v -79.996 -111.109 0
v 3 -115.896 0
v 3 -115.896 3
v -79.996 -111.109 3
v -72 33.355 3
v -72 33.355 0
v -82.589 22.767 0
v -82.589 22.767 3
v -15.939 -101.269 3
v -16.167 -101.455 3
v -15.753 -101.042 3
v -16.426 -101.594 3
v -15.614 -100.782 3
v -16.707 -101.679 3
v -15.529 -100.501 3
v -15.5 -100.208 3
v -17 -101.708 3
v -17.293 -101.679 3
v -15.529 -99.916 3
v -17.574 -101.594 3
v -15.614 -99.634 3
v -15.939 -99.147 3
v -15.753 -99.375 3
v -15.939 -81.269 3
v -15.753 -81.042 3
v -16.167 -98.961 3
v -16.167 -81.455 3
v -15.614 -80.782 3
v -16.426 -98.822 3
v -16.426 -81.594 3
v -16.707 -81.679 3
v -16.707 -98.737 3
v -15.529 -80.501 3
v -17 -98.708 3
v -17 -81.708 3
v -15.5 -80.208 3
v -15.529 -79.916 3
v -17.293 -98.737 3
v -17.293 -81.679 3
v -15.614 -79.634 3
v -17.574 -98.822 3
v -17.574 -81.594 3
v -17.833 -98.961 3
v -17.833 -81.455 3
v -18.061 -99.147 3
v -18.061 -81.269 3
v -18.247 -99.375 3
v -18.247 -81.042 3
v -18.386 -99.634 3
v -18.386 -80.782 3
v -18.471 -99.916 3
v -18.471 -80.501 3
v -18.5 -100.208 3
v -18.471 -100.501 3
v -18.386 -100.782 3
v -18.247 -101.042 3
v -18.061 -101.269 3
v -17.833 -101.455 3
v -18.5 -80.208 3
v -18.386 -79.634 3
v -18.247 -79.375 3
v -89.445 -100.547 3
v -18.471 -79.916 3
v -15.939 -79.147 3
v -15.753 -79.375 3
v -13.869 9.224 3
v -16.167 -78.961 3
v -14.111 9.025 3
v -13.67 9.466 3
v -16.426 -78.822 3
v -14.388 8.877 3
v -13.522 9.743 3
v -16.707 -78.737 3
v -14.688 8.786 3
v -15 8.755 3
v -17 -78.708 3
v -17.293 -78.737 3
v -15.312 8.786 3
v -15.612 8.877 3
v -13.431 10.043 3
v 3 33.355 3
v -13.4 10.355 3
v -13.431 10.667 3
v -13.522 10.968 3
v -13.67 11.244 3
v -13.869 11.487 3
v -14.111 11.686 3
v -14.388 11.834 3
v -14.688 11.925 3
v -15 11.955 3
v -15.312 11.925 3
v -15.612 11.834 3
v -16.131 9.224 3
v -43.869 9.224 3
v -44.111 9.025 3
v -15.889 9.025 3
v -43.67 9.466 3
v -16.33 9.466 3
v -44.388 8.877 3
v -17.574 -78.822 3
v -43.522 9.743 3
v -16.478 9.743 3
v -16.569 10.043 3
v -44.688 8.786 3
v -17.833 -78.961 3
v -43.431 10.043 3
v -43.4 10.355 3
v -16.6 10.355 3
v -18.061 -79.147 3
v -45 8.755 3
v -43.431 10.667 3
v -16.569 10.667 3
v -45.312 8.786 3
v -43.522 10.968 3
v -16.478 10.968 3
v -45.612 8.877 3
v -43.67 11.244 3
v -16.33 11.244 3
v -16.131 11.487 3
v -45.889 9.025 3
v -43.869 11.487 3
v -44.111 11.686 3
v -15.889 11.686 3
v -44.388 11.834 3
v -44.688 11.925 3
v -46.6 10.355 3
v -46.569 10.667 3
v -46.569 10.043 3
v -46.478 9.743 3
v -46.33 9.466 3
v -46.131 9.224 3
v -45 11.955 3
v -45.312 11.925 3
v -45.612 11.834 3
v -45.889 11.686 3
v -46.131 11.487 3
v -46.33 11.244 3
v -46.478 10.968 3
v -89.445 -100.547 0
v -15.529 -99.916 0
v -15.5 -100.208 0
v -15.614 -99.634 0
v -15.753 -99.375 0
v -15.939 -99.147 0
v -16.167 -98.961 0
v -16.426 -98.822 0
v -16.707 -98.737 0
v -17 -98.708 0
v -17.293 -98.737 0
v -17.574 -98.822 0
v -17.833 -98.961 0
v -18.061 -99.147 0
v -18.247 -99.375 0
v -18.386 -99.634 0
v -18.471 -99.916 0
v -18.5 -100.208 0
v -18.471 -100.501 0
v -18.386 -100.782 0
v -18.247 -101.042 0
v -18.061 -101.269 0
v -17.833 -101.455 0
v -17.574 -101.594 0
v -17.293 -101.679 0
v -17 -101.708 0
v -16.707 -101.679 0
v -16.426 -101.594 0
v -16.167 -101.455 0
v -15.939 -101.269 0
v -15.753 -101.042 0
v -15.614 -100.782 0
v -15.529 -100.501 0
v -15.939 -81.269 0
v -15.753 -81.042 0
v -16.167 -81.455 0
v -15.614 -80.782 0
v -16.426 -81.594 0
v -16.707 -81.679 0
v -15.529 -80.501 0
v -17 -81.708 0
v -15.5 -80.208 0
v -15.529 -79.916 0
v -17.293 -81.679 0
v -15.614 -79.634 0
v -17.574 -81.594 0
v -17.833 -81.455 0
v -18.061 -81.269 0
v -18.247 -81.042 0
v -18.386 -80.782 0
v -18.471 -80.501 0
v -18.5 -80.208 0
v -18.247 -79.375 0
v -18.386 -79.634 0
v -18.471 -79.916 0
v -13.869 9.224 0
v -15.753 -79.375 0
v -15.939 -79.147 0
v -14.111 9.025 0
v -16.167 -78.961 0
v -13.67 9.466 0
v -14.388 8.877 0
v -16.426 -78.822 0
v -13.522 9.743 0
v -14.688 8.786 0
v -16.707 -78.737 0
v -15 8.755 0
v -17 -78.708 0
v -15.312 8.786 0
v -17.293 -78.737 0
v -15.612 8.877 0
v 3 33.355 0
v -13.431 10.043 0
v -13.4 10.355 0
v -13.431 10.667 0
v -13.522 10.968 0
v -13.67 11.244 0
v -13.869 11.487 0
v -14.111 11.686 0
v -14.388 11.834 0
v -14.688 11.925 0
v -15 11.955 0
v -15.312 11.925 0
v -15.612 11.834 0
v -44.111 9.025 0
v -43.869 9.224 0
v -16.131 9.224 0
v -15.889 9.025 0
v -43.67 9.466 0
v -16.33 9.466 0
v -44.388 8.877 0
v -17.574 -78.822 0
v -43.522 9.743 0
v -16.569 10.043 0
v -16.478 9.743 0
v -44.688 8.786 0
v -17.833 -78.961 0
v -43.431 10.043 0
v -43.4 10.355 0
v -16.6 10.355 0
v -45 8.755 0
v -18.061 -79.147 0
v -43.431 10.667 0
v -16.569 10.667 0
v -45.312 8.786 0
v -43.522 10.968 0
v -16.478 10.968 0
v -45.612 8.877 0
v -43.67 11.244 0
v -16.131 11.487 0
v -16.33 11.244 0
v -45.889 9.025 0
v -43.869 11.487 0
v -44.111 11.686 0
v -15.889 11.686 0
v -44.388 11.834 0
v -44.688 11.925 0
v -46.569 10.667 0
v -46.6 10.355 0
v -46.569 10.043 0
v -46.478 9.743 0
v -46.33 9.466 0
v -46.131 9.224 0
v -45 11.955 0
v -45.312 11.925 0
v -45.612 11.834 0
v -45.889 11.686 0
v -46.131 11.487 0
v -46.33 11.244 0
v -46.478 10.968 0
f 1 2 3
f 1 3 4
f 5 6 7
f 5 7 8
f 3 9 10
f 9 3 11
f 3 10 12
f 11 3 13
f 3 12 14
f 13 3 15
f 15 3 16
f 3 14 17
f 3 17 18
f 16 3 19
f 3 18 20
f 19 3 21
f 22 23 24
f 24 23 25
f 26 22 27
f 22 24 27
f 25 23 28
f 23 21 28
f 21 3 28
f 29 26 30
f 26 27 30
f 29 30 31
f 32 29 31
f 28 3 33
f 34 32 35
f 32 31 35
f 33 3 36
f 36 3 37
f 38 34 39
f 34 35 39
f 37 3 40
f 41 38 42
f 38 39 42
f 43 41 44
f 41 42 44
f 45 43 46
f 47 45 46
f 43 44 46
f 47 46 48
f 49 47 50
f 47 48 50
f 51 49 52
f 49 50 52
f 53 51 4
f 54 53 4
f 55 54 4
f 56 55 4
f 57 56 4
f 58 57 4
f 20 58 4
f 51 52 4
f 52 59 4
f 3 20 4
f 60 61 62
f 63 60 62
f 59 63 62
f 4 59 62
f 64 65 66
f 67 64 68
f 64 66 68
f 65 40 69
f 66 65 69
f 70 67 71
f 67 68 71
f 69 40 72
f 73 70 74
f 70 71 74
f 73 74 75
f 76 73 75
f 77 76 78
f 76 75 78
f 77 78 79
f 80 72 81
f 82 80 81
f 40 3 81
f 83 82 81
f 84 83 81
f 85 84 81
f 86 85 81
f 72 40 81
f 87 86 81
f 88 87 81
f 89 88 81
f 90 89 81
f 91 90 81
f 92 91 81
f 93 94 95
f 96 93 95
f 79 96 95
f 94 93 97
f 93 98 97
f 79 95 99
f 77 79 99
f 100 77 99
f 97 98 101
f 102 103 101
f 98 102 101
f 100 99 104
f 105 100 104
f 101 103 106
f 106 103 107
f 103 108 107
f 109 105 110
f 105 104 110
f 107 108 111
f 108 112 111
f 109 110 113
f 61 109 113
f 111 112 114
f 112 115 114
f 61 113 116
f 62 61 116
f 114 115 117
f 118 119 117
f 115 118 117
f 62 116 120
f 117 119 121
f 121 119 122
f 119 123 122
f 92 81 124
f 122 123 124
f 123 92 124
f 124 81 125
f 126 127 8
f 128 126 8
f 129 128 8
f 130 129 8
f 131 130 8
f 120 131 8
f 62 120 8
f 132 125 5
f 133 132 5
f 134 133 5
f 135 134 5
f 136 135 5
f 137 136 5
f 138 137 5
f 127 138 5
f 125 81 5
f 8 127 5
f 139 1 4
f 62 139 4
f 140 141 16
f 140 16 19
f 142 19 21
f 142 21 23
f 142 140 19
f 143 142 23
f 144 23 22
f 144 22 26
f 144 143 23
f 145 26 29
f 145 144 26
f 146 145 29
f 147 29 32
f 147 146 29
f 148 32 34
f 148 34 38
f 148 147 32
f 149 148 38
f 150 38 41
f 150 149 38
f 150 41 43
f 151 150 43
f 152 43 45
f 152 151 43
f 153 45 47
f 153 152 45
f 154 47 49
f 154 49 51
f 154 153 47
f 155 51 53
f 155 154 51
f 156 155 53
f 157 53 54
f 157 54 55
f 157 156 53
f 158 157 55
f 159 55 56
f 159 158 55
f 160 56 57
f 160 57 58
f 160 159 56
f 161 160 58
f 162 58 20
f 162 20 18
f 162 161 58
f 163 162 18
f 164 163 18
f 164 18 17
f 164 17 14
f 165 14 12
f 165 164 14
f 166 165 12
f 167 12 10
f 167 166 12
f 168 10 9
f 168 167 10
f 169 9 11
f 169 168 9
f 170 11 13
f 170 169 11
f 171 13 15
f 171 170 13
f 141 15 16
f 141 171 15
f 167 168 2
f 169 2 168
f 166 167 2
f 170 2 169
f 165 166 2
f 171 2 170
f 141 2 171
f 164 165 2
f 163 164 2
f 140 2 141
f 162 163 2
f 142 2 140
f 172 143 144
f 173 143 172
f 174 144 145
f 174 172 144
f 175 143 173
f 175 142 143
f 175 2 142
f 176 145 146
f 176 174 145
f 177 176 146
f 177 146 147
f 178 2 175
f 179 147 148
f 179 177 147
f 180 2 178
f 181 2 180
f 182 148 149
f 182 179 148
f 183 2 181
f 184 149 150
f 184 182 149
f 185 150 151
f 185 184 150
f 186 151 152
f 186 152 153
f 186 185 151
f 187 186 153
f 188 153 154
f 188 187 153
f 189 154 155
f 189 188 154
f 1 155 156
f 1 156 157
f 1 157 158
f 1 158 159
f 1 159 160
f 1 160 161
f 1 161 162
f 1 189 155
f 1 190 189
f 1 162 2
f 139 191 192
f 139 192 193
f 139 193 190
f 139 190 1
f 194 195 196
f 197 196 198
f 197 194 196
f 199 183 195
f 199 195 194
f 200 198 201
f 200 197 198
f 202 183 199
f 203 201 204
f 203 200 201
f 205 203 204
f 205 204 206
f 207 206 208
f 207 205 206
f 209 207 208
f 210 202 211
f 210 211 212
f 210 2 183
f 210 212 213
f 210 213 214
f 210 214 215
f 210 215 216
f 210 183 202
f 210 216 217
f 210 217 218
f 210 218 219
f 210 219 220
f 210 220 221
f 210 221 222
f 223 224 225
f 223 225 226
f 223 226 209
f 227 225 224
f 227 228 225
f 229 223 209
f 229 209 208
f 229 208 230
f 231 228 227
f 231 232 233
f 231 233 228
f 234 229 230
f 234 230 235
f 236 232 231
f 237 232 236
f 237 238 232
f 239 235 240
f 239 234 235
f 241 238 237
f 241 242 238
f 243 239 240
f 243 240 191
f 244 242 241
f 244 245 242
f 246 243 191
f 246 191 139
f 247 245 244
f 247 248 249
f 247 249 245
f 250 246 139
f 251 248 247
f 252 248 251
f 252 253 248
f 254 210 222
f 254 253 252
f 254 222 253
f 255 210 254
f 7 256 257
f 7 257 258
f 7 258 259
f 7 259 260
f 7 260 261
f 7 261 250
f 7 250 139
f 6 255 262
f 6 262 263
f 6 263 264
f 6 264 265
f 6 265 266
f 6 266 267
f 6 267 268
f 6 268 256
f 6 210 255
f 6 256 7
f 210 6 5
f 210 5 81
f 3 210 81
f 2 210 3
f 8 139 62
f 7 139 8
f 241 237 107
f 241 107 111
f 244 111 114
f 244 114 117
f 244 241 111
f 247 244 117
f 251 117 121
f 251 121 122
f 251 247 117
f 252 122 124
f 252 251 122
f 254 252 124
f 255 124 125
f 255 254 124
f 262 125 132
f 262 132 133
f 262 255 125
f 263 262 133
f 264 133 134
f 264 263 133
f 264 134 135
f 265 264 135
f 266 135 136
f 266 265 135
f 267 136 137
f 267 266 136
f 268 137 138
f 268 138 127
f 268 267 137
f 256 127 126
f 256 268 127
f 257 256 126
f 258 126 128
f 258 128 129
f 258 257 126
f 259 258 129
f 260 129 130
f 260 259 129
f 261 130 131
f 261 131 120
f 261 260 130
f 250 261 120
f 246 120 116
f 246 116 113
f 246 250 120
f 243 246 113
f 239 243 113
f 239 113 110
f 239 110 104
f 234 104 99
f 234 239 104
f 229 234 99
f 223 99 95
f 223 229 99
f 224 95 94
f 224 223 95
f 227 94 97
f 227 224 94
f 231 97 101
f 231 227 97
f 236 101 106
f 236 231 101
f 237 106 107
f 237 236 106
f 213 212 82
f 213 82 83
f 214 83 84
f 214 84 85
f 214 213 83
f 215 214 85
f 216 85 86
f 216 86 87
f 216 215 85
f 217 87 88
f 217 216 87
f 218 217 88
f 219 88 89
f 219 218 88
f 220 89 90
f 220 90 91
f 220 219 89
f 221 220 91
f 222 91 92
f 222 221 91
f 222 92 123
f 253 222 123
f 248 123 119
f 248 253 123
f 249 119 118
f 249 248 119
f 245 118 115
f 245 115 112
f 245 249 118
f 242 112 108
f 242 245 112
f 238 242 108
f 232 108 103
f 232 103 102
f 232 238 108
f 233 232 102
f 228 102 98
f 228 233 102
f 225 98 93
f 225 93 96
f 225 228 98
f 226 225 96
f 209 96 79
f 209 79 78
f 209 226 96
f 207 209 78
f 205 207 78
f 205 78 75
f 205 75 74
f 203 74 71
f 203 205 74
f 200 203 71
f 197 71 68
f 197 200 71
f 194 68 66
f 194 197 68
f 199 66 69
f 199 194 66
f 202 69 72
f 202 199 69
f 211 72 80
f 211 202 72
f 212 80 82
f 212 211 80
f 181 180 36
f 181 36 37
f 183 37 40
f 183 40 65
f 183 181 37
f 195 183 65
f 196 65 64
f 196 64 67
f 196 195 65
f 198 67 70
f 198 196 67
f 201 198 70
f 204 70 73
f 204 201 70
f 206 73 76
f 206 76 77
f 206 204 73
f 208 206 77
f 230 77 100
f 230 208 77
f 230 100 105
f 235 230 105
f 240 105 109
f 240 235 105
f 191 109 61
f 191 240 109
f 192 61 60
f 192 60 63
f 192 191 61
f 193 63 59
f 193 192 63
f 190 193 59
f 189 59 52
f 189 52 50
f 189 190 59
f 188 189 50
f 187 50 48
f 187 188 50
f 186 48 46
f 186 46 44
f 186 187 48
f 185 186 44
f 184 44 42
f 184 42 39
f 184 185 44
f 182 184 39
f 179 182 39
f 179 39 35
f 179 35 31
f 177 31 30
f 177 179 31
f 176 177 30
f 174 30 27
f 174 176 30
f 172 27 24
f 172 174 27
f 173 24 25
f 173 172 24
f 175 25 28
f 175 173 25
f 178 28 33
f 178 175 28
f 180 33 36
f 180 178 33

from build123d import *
from OCP.BRepFilletAPI import BRepFilletAPI_MakeChamfer

# Parameters (mm, degrees)
SKETCH1_R           = 1.6
SKETCH1_R_2         = 1.5
BOSS_EXTRUDE1_DEPTH = 3
CHAMFER1_SIZE       = 10
CHAMFER1_SIZE2      = 10.020818191
CHAMFER1_SIZE2_2    = 10.605077774


with BuildPart() as part:
    # Sketch1 → Boss-Extrude1 (new body)
    with BuildSketch(Plane.XY):
        Polygon((-82, 33.355339059), (3, 33.355339059), (3, -115.896085726), (-90, -110.53173818), align=None)
        with Locations((-45, 10.355339059)):
            Circle(SKETCH1_R, mode=Mode.SUBTRACT)
        with Locations((-15, 10.355339059)):
            Circle(SKETCH1_R, mode=Mode.SUBTRACT)
        with Locations((-17, -80.208152802)):
            Circle(SKETCH1_R_2, mode=Mode.SUBTRACT)
        with Locations((-17, -100.208152802)):
            Circle(SKETCH1_R_2, mode=Mode.SUBTRACT)
    extrude(amount=BOSS_EXTRUDE1_DEPTH)

    # Chamfer1: one chamfer whose edges measure the first distance from different faces: ONE call of the kernel's chamfer builder (chamfer() names one face for all edges)
    chamfer1_edges_1 = [part.edges().sort_by_distance(p)[0] for p in [
        (-90, -110.53173818, 1.5),
    ]]
    chamfer1_side_1 = [part.faces().sort_by_distance(p)[0] for p in [
        (-86, -38.588199561, 1.5),
    ]]
    chamfer1_edges_2 = [part.edges().sort_by_distance(p)[0] for p in [
        (-82, 33.355339059, 1.5),
    ]]
    chamfer1_side_2 = [part.faces().sort_by_distance(p)[0] for p in [
        (-39.5, 33.355339059, 1.5),
    ]]
    chamfer1 = BRepFilletAPI_MakeChamfer(part.part.solid().wrapped)
    for e in chamfer1_edges_1:
        chamfer1.Add(CHAMFER1_SIZE, CHAMFER1_SIZE2, e.wrapped, chamfer1_side_1[0].wrapped)  # the first distance lies on this face
    for e in chamfer1_edges_2:
        chamfer1.Add(CHAMFER1_SIZE, CHAMFER1_SIZE2_2, e.wrapped, chamfer1_side_2[0].wrapped)  # the first distance lies on this face
    add(Compound.cast(chamfer1.Shape()), mode=Mode.REPLACE)


solid = part.part
